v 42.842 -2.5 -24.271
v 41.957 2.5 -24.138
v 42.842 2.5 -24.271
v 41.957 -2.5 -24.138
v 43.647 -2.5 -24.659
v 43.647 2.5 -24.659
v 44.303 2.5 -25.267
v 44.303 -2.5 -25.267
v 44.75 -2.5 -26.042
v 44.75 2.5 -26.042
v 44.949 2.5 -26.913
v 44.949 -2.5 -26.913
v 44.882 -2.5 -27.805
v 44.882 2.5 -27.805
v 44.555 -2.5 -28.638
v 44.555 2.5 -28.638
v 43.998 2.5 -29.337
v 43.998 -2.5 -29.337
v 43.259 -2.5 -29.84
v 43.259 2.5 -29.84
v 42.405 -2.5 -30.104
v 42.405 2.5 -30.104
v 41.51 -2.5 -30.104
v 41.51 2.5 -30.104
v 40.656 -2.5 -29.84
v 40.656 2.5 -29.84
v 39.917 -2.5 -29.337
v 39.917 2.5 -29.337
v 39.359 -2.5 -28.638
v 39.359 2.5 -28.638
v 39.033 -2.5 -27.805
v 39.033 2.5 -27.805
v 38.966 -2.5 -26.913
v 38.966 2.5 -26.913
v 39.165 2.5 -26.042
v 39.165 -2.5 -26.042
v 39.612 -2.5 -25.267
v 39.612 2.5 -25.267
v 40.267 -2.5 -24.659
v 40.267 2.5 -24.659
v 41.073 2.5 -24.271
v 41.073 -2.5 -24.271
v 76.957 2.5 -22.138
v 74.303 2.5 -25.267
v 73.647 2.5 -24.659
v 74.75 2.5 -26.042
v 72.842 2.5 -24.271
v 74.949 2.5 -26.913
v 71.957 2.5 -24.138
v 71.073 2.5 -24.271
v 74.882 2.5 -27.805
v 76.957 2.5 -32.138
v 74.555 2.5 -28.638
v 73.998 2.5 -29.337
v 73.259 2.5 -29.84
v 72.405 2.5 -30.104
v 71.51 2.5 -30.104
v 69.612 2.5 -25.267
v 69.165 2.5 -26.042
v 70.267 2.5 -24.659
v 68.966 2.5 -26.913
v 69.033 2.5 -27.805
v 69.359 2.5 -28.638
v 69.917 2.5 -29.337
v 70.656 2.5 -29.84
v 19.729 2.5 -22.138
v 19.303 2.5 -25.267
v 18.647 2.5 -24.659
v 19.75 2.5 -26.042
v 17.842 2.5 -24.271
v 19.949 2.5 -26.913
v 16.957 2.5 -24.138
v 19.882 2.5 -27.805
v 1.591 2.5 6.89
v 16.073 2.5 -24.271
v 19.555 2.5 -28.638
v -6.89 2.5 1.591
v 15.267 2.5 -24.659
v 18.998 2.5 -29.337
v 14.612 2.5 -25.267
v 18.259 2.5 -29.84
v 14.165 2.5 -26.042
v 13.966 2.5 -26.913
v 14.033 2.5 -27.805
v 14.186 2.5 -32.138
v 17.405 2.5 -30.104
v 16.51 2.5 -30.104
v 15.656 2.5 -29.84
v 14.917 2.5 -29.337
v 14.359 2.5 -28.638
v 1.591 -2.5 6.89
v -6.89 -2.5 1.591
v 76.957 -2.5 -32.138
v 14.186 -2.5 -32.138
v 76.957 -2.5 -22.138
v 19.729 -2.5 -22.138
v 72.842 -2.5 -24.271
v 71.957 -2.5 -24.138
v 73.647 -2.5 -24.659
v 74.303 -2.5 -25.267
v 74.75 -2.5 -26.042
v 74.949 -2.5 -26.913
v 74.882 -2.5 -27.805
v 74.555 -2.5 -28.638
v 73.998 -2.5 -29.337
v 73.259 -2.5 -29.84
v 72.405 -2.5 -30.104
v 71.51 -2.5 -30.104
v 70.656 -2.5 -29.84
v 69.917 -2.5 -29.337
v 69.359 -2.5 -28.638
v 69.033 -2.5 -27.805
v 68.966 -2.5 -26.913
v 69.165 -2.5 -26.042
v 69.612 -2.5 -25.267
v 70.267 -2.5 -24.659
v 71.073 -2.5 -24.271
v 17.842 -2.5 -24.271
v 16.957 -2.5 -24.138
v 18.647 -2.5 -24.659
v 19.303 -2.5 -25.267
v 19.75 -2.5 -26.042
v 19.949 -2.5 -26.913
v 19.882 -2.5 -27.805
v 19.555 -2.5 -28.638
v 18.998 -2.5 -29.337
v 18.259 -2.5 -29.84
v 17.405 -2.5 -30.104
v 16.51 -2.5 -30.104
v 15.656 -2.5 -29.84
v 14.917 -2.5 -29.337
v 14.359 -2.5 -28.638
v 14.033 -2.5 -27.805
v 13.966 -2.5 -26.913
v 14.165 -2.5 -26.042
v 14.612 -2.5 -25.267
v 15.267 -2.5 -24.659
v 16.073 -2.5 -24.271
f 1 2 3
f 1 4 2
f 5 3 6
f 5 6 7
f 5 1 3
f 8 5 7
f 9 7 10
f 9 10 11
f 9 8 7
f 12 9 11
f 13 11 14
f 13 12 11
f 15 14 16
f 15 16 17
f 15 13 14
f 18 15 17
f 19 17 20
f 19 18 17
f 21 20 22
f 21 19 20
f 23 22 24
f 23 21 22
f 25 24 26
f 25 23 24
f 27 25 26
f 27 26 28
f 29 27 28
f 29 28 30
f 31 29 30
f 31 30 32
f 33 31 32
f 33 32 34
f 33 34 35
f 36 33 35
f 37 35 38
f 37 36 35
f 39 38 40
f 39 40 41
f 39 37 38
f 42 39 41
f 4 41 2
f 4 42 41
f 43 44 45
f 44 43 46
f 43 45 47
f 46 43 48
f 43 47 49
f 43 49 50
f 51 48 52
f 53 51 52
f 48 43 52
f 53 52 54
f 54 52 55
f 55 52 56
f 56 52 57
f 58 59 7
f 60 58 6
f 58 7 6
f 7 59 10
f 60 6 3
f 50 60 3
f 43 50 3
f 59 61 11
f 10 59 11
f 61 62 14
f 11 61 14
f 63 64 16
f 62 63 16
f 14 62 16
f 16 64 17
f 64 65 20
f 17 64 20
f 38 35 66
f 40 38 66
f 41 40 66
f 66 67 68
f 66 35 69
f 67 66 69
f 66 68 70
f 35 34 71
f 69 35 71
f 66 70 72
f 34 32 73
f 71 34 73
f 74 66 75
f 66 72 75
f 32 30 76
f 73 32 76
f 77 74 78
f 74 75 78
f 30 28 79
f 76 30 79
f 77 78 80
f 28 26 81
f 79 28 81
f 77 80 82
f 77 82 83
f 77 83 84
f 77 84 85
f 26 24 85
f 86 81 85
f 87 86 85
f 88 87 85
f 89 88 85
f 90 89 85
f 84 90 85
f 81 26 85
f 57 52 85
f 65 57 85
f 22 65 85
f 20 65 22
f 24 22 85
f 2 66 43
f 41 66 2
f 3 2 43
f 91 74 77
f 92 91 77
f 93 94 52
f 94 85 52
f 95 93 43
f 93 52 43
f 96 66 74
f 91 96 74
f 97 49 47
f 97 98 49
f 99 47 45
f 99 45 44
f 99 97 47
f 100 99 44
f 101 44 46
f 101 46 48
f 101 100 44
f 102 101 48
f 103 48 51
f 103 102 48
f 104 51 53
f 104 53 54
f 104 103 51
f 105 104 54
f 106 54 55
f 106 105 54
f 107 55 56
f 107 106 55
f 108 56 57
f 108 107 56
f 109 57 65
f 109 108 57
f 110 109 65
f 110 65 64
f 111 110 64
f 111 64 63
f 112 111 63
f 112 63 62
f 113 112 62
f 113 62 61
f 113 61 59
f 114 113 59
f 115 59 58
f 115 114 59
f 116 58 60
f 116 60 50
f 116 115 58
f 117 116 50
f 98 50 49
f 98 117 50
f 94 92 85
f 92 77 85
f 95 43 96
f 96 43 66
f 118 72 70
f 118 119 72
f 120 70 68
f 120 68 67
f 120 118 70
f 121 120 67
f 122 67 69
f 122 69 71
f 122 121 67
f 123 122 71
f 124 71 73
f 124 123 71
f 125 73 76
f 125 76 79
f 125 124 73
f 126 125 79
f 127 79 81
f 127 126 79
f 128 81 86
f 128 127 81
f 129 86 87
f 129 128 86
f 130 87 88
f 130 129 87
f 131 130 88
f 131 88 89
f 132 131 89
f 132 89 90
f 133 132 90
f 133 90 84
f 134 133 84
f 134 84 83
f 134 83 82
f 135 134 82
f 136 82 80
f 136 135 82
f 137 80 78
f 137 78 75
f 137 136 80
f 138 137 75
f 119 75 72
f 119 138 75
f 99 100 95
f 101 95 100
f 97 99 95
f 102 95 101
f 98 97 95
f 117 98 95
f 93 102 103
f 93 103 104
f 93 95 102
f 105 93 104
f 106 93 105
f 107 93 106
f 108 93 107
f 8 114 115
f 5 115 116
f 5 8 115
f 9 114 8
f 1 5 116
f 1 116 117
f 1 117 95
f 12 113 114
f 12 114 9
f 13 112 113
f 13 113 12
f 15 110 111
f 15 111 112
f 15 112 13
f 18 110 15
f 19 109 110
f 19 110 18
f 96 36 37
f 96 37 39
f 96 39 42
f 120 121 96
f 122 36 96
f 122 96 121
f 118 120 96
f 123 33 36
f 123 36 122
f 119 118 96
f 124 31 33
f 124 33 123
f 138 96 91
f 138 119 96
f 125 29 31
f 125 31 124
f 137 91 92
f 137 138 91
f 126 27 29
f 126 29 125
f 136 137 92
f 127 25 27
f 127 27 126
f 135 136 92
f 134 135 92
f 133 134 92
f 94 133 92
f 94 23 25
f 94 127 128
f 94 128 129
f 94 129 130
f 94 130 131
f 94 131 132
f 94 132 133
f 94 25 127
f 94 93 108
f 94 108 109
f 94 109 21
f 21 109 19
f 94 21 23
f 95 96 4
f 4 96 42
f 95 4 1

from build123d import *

# Parameters (mm, degrees)
SKETCH1_R           = 3
BOSS_EXTRUDE2_DEPTH = 2.5


with BuildPart() as part:
    # Sketch1 → Boss-Extrude2 (new, symmetric)
    with BuildSketch(Plane(origin=(0, 0, 0), x_dir=(1, 0, 0), z_dir=(0, 1, 0))):
        Polygon((1.59064416, -6.889836802), (-6.889836802, -1.59064416), (14.185871198, 32.137539077), (76.957416455, 32.137539077), (76.957416455, 22.137539077), (19.728961713, 22.137539077), align=None)
        with Locations(Location((16.957416455, 27.137539077, 0), (0, 0, 270))):
            Circle(SKETCH1_R, mode=Mode.SUBTRACT)
        with Locations(Location((71.957416455, 27.137539077, 0), (0, 0, 270))):
            Circle(SKETCH1_R, mode=Mode.SUBTRACT)
        with Locations(Location((41.957416455, 27.137539077, 0), (0, 0, 270))):
            Circle(SKETCH1_R, mode=Mode.SUBTRACT)
    extrude(amount=BOSS_EXTRUDE2_DEPTH, both=True)


solid = part.part
